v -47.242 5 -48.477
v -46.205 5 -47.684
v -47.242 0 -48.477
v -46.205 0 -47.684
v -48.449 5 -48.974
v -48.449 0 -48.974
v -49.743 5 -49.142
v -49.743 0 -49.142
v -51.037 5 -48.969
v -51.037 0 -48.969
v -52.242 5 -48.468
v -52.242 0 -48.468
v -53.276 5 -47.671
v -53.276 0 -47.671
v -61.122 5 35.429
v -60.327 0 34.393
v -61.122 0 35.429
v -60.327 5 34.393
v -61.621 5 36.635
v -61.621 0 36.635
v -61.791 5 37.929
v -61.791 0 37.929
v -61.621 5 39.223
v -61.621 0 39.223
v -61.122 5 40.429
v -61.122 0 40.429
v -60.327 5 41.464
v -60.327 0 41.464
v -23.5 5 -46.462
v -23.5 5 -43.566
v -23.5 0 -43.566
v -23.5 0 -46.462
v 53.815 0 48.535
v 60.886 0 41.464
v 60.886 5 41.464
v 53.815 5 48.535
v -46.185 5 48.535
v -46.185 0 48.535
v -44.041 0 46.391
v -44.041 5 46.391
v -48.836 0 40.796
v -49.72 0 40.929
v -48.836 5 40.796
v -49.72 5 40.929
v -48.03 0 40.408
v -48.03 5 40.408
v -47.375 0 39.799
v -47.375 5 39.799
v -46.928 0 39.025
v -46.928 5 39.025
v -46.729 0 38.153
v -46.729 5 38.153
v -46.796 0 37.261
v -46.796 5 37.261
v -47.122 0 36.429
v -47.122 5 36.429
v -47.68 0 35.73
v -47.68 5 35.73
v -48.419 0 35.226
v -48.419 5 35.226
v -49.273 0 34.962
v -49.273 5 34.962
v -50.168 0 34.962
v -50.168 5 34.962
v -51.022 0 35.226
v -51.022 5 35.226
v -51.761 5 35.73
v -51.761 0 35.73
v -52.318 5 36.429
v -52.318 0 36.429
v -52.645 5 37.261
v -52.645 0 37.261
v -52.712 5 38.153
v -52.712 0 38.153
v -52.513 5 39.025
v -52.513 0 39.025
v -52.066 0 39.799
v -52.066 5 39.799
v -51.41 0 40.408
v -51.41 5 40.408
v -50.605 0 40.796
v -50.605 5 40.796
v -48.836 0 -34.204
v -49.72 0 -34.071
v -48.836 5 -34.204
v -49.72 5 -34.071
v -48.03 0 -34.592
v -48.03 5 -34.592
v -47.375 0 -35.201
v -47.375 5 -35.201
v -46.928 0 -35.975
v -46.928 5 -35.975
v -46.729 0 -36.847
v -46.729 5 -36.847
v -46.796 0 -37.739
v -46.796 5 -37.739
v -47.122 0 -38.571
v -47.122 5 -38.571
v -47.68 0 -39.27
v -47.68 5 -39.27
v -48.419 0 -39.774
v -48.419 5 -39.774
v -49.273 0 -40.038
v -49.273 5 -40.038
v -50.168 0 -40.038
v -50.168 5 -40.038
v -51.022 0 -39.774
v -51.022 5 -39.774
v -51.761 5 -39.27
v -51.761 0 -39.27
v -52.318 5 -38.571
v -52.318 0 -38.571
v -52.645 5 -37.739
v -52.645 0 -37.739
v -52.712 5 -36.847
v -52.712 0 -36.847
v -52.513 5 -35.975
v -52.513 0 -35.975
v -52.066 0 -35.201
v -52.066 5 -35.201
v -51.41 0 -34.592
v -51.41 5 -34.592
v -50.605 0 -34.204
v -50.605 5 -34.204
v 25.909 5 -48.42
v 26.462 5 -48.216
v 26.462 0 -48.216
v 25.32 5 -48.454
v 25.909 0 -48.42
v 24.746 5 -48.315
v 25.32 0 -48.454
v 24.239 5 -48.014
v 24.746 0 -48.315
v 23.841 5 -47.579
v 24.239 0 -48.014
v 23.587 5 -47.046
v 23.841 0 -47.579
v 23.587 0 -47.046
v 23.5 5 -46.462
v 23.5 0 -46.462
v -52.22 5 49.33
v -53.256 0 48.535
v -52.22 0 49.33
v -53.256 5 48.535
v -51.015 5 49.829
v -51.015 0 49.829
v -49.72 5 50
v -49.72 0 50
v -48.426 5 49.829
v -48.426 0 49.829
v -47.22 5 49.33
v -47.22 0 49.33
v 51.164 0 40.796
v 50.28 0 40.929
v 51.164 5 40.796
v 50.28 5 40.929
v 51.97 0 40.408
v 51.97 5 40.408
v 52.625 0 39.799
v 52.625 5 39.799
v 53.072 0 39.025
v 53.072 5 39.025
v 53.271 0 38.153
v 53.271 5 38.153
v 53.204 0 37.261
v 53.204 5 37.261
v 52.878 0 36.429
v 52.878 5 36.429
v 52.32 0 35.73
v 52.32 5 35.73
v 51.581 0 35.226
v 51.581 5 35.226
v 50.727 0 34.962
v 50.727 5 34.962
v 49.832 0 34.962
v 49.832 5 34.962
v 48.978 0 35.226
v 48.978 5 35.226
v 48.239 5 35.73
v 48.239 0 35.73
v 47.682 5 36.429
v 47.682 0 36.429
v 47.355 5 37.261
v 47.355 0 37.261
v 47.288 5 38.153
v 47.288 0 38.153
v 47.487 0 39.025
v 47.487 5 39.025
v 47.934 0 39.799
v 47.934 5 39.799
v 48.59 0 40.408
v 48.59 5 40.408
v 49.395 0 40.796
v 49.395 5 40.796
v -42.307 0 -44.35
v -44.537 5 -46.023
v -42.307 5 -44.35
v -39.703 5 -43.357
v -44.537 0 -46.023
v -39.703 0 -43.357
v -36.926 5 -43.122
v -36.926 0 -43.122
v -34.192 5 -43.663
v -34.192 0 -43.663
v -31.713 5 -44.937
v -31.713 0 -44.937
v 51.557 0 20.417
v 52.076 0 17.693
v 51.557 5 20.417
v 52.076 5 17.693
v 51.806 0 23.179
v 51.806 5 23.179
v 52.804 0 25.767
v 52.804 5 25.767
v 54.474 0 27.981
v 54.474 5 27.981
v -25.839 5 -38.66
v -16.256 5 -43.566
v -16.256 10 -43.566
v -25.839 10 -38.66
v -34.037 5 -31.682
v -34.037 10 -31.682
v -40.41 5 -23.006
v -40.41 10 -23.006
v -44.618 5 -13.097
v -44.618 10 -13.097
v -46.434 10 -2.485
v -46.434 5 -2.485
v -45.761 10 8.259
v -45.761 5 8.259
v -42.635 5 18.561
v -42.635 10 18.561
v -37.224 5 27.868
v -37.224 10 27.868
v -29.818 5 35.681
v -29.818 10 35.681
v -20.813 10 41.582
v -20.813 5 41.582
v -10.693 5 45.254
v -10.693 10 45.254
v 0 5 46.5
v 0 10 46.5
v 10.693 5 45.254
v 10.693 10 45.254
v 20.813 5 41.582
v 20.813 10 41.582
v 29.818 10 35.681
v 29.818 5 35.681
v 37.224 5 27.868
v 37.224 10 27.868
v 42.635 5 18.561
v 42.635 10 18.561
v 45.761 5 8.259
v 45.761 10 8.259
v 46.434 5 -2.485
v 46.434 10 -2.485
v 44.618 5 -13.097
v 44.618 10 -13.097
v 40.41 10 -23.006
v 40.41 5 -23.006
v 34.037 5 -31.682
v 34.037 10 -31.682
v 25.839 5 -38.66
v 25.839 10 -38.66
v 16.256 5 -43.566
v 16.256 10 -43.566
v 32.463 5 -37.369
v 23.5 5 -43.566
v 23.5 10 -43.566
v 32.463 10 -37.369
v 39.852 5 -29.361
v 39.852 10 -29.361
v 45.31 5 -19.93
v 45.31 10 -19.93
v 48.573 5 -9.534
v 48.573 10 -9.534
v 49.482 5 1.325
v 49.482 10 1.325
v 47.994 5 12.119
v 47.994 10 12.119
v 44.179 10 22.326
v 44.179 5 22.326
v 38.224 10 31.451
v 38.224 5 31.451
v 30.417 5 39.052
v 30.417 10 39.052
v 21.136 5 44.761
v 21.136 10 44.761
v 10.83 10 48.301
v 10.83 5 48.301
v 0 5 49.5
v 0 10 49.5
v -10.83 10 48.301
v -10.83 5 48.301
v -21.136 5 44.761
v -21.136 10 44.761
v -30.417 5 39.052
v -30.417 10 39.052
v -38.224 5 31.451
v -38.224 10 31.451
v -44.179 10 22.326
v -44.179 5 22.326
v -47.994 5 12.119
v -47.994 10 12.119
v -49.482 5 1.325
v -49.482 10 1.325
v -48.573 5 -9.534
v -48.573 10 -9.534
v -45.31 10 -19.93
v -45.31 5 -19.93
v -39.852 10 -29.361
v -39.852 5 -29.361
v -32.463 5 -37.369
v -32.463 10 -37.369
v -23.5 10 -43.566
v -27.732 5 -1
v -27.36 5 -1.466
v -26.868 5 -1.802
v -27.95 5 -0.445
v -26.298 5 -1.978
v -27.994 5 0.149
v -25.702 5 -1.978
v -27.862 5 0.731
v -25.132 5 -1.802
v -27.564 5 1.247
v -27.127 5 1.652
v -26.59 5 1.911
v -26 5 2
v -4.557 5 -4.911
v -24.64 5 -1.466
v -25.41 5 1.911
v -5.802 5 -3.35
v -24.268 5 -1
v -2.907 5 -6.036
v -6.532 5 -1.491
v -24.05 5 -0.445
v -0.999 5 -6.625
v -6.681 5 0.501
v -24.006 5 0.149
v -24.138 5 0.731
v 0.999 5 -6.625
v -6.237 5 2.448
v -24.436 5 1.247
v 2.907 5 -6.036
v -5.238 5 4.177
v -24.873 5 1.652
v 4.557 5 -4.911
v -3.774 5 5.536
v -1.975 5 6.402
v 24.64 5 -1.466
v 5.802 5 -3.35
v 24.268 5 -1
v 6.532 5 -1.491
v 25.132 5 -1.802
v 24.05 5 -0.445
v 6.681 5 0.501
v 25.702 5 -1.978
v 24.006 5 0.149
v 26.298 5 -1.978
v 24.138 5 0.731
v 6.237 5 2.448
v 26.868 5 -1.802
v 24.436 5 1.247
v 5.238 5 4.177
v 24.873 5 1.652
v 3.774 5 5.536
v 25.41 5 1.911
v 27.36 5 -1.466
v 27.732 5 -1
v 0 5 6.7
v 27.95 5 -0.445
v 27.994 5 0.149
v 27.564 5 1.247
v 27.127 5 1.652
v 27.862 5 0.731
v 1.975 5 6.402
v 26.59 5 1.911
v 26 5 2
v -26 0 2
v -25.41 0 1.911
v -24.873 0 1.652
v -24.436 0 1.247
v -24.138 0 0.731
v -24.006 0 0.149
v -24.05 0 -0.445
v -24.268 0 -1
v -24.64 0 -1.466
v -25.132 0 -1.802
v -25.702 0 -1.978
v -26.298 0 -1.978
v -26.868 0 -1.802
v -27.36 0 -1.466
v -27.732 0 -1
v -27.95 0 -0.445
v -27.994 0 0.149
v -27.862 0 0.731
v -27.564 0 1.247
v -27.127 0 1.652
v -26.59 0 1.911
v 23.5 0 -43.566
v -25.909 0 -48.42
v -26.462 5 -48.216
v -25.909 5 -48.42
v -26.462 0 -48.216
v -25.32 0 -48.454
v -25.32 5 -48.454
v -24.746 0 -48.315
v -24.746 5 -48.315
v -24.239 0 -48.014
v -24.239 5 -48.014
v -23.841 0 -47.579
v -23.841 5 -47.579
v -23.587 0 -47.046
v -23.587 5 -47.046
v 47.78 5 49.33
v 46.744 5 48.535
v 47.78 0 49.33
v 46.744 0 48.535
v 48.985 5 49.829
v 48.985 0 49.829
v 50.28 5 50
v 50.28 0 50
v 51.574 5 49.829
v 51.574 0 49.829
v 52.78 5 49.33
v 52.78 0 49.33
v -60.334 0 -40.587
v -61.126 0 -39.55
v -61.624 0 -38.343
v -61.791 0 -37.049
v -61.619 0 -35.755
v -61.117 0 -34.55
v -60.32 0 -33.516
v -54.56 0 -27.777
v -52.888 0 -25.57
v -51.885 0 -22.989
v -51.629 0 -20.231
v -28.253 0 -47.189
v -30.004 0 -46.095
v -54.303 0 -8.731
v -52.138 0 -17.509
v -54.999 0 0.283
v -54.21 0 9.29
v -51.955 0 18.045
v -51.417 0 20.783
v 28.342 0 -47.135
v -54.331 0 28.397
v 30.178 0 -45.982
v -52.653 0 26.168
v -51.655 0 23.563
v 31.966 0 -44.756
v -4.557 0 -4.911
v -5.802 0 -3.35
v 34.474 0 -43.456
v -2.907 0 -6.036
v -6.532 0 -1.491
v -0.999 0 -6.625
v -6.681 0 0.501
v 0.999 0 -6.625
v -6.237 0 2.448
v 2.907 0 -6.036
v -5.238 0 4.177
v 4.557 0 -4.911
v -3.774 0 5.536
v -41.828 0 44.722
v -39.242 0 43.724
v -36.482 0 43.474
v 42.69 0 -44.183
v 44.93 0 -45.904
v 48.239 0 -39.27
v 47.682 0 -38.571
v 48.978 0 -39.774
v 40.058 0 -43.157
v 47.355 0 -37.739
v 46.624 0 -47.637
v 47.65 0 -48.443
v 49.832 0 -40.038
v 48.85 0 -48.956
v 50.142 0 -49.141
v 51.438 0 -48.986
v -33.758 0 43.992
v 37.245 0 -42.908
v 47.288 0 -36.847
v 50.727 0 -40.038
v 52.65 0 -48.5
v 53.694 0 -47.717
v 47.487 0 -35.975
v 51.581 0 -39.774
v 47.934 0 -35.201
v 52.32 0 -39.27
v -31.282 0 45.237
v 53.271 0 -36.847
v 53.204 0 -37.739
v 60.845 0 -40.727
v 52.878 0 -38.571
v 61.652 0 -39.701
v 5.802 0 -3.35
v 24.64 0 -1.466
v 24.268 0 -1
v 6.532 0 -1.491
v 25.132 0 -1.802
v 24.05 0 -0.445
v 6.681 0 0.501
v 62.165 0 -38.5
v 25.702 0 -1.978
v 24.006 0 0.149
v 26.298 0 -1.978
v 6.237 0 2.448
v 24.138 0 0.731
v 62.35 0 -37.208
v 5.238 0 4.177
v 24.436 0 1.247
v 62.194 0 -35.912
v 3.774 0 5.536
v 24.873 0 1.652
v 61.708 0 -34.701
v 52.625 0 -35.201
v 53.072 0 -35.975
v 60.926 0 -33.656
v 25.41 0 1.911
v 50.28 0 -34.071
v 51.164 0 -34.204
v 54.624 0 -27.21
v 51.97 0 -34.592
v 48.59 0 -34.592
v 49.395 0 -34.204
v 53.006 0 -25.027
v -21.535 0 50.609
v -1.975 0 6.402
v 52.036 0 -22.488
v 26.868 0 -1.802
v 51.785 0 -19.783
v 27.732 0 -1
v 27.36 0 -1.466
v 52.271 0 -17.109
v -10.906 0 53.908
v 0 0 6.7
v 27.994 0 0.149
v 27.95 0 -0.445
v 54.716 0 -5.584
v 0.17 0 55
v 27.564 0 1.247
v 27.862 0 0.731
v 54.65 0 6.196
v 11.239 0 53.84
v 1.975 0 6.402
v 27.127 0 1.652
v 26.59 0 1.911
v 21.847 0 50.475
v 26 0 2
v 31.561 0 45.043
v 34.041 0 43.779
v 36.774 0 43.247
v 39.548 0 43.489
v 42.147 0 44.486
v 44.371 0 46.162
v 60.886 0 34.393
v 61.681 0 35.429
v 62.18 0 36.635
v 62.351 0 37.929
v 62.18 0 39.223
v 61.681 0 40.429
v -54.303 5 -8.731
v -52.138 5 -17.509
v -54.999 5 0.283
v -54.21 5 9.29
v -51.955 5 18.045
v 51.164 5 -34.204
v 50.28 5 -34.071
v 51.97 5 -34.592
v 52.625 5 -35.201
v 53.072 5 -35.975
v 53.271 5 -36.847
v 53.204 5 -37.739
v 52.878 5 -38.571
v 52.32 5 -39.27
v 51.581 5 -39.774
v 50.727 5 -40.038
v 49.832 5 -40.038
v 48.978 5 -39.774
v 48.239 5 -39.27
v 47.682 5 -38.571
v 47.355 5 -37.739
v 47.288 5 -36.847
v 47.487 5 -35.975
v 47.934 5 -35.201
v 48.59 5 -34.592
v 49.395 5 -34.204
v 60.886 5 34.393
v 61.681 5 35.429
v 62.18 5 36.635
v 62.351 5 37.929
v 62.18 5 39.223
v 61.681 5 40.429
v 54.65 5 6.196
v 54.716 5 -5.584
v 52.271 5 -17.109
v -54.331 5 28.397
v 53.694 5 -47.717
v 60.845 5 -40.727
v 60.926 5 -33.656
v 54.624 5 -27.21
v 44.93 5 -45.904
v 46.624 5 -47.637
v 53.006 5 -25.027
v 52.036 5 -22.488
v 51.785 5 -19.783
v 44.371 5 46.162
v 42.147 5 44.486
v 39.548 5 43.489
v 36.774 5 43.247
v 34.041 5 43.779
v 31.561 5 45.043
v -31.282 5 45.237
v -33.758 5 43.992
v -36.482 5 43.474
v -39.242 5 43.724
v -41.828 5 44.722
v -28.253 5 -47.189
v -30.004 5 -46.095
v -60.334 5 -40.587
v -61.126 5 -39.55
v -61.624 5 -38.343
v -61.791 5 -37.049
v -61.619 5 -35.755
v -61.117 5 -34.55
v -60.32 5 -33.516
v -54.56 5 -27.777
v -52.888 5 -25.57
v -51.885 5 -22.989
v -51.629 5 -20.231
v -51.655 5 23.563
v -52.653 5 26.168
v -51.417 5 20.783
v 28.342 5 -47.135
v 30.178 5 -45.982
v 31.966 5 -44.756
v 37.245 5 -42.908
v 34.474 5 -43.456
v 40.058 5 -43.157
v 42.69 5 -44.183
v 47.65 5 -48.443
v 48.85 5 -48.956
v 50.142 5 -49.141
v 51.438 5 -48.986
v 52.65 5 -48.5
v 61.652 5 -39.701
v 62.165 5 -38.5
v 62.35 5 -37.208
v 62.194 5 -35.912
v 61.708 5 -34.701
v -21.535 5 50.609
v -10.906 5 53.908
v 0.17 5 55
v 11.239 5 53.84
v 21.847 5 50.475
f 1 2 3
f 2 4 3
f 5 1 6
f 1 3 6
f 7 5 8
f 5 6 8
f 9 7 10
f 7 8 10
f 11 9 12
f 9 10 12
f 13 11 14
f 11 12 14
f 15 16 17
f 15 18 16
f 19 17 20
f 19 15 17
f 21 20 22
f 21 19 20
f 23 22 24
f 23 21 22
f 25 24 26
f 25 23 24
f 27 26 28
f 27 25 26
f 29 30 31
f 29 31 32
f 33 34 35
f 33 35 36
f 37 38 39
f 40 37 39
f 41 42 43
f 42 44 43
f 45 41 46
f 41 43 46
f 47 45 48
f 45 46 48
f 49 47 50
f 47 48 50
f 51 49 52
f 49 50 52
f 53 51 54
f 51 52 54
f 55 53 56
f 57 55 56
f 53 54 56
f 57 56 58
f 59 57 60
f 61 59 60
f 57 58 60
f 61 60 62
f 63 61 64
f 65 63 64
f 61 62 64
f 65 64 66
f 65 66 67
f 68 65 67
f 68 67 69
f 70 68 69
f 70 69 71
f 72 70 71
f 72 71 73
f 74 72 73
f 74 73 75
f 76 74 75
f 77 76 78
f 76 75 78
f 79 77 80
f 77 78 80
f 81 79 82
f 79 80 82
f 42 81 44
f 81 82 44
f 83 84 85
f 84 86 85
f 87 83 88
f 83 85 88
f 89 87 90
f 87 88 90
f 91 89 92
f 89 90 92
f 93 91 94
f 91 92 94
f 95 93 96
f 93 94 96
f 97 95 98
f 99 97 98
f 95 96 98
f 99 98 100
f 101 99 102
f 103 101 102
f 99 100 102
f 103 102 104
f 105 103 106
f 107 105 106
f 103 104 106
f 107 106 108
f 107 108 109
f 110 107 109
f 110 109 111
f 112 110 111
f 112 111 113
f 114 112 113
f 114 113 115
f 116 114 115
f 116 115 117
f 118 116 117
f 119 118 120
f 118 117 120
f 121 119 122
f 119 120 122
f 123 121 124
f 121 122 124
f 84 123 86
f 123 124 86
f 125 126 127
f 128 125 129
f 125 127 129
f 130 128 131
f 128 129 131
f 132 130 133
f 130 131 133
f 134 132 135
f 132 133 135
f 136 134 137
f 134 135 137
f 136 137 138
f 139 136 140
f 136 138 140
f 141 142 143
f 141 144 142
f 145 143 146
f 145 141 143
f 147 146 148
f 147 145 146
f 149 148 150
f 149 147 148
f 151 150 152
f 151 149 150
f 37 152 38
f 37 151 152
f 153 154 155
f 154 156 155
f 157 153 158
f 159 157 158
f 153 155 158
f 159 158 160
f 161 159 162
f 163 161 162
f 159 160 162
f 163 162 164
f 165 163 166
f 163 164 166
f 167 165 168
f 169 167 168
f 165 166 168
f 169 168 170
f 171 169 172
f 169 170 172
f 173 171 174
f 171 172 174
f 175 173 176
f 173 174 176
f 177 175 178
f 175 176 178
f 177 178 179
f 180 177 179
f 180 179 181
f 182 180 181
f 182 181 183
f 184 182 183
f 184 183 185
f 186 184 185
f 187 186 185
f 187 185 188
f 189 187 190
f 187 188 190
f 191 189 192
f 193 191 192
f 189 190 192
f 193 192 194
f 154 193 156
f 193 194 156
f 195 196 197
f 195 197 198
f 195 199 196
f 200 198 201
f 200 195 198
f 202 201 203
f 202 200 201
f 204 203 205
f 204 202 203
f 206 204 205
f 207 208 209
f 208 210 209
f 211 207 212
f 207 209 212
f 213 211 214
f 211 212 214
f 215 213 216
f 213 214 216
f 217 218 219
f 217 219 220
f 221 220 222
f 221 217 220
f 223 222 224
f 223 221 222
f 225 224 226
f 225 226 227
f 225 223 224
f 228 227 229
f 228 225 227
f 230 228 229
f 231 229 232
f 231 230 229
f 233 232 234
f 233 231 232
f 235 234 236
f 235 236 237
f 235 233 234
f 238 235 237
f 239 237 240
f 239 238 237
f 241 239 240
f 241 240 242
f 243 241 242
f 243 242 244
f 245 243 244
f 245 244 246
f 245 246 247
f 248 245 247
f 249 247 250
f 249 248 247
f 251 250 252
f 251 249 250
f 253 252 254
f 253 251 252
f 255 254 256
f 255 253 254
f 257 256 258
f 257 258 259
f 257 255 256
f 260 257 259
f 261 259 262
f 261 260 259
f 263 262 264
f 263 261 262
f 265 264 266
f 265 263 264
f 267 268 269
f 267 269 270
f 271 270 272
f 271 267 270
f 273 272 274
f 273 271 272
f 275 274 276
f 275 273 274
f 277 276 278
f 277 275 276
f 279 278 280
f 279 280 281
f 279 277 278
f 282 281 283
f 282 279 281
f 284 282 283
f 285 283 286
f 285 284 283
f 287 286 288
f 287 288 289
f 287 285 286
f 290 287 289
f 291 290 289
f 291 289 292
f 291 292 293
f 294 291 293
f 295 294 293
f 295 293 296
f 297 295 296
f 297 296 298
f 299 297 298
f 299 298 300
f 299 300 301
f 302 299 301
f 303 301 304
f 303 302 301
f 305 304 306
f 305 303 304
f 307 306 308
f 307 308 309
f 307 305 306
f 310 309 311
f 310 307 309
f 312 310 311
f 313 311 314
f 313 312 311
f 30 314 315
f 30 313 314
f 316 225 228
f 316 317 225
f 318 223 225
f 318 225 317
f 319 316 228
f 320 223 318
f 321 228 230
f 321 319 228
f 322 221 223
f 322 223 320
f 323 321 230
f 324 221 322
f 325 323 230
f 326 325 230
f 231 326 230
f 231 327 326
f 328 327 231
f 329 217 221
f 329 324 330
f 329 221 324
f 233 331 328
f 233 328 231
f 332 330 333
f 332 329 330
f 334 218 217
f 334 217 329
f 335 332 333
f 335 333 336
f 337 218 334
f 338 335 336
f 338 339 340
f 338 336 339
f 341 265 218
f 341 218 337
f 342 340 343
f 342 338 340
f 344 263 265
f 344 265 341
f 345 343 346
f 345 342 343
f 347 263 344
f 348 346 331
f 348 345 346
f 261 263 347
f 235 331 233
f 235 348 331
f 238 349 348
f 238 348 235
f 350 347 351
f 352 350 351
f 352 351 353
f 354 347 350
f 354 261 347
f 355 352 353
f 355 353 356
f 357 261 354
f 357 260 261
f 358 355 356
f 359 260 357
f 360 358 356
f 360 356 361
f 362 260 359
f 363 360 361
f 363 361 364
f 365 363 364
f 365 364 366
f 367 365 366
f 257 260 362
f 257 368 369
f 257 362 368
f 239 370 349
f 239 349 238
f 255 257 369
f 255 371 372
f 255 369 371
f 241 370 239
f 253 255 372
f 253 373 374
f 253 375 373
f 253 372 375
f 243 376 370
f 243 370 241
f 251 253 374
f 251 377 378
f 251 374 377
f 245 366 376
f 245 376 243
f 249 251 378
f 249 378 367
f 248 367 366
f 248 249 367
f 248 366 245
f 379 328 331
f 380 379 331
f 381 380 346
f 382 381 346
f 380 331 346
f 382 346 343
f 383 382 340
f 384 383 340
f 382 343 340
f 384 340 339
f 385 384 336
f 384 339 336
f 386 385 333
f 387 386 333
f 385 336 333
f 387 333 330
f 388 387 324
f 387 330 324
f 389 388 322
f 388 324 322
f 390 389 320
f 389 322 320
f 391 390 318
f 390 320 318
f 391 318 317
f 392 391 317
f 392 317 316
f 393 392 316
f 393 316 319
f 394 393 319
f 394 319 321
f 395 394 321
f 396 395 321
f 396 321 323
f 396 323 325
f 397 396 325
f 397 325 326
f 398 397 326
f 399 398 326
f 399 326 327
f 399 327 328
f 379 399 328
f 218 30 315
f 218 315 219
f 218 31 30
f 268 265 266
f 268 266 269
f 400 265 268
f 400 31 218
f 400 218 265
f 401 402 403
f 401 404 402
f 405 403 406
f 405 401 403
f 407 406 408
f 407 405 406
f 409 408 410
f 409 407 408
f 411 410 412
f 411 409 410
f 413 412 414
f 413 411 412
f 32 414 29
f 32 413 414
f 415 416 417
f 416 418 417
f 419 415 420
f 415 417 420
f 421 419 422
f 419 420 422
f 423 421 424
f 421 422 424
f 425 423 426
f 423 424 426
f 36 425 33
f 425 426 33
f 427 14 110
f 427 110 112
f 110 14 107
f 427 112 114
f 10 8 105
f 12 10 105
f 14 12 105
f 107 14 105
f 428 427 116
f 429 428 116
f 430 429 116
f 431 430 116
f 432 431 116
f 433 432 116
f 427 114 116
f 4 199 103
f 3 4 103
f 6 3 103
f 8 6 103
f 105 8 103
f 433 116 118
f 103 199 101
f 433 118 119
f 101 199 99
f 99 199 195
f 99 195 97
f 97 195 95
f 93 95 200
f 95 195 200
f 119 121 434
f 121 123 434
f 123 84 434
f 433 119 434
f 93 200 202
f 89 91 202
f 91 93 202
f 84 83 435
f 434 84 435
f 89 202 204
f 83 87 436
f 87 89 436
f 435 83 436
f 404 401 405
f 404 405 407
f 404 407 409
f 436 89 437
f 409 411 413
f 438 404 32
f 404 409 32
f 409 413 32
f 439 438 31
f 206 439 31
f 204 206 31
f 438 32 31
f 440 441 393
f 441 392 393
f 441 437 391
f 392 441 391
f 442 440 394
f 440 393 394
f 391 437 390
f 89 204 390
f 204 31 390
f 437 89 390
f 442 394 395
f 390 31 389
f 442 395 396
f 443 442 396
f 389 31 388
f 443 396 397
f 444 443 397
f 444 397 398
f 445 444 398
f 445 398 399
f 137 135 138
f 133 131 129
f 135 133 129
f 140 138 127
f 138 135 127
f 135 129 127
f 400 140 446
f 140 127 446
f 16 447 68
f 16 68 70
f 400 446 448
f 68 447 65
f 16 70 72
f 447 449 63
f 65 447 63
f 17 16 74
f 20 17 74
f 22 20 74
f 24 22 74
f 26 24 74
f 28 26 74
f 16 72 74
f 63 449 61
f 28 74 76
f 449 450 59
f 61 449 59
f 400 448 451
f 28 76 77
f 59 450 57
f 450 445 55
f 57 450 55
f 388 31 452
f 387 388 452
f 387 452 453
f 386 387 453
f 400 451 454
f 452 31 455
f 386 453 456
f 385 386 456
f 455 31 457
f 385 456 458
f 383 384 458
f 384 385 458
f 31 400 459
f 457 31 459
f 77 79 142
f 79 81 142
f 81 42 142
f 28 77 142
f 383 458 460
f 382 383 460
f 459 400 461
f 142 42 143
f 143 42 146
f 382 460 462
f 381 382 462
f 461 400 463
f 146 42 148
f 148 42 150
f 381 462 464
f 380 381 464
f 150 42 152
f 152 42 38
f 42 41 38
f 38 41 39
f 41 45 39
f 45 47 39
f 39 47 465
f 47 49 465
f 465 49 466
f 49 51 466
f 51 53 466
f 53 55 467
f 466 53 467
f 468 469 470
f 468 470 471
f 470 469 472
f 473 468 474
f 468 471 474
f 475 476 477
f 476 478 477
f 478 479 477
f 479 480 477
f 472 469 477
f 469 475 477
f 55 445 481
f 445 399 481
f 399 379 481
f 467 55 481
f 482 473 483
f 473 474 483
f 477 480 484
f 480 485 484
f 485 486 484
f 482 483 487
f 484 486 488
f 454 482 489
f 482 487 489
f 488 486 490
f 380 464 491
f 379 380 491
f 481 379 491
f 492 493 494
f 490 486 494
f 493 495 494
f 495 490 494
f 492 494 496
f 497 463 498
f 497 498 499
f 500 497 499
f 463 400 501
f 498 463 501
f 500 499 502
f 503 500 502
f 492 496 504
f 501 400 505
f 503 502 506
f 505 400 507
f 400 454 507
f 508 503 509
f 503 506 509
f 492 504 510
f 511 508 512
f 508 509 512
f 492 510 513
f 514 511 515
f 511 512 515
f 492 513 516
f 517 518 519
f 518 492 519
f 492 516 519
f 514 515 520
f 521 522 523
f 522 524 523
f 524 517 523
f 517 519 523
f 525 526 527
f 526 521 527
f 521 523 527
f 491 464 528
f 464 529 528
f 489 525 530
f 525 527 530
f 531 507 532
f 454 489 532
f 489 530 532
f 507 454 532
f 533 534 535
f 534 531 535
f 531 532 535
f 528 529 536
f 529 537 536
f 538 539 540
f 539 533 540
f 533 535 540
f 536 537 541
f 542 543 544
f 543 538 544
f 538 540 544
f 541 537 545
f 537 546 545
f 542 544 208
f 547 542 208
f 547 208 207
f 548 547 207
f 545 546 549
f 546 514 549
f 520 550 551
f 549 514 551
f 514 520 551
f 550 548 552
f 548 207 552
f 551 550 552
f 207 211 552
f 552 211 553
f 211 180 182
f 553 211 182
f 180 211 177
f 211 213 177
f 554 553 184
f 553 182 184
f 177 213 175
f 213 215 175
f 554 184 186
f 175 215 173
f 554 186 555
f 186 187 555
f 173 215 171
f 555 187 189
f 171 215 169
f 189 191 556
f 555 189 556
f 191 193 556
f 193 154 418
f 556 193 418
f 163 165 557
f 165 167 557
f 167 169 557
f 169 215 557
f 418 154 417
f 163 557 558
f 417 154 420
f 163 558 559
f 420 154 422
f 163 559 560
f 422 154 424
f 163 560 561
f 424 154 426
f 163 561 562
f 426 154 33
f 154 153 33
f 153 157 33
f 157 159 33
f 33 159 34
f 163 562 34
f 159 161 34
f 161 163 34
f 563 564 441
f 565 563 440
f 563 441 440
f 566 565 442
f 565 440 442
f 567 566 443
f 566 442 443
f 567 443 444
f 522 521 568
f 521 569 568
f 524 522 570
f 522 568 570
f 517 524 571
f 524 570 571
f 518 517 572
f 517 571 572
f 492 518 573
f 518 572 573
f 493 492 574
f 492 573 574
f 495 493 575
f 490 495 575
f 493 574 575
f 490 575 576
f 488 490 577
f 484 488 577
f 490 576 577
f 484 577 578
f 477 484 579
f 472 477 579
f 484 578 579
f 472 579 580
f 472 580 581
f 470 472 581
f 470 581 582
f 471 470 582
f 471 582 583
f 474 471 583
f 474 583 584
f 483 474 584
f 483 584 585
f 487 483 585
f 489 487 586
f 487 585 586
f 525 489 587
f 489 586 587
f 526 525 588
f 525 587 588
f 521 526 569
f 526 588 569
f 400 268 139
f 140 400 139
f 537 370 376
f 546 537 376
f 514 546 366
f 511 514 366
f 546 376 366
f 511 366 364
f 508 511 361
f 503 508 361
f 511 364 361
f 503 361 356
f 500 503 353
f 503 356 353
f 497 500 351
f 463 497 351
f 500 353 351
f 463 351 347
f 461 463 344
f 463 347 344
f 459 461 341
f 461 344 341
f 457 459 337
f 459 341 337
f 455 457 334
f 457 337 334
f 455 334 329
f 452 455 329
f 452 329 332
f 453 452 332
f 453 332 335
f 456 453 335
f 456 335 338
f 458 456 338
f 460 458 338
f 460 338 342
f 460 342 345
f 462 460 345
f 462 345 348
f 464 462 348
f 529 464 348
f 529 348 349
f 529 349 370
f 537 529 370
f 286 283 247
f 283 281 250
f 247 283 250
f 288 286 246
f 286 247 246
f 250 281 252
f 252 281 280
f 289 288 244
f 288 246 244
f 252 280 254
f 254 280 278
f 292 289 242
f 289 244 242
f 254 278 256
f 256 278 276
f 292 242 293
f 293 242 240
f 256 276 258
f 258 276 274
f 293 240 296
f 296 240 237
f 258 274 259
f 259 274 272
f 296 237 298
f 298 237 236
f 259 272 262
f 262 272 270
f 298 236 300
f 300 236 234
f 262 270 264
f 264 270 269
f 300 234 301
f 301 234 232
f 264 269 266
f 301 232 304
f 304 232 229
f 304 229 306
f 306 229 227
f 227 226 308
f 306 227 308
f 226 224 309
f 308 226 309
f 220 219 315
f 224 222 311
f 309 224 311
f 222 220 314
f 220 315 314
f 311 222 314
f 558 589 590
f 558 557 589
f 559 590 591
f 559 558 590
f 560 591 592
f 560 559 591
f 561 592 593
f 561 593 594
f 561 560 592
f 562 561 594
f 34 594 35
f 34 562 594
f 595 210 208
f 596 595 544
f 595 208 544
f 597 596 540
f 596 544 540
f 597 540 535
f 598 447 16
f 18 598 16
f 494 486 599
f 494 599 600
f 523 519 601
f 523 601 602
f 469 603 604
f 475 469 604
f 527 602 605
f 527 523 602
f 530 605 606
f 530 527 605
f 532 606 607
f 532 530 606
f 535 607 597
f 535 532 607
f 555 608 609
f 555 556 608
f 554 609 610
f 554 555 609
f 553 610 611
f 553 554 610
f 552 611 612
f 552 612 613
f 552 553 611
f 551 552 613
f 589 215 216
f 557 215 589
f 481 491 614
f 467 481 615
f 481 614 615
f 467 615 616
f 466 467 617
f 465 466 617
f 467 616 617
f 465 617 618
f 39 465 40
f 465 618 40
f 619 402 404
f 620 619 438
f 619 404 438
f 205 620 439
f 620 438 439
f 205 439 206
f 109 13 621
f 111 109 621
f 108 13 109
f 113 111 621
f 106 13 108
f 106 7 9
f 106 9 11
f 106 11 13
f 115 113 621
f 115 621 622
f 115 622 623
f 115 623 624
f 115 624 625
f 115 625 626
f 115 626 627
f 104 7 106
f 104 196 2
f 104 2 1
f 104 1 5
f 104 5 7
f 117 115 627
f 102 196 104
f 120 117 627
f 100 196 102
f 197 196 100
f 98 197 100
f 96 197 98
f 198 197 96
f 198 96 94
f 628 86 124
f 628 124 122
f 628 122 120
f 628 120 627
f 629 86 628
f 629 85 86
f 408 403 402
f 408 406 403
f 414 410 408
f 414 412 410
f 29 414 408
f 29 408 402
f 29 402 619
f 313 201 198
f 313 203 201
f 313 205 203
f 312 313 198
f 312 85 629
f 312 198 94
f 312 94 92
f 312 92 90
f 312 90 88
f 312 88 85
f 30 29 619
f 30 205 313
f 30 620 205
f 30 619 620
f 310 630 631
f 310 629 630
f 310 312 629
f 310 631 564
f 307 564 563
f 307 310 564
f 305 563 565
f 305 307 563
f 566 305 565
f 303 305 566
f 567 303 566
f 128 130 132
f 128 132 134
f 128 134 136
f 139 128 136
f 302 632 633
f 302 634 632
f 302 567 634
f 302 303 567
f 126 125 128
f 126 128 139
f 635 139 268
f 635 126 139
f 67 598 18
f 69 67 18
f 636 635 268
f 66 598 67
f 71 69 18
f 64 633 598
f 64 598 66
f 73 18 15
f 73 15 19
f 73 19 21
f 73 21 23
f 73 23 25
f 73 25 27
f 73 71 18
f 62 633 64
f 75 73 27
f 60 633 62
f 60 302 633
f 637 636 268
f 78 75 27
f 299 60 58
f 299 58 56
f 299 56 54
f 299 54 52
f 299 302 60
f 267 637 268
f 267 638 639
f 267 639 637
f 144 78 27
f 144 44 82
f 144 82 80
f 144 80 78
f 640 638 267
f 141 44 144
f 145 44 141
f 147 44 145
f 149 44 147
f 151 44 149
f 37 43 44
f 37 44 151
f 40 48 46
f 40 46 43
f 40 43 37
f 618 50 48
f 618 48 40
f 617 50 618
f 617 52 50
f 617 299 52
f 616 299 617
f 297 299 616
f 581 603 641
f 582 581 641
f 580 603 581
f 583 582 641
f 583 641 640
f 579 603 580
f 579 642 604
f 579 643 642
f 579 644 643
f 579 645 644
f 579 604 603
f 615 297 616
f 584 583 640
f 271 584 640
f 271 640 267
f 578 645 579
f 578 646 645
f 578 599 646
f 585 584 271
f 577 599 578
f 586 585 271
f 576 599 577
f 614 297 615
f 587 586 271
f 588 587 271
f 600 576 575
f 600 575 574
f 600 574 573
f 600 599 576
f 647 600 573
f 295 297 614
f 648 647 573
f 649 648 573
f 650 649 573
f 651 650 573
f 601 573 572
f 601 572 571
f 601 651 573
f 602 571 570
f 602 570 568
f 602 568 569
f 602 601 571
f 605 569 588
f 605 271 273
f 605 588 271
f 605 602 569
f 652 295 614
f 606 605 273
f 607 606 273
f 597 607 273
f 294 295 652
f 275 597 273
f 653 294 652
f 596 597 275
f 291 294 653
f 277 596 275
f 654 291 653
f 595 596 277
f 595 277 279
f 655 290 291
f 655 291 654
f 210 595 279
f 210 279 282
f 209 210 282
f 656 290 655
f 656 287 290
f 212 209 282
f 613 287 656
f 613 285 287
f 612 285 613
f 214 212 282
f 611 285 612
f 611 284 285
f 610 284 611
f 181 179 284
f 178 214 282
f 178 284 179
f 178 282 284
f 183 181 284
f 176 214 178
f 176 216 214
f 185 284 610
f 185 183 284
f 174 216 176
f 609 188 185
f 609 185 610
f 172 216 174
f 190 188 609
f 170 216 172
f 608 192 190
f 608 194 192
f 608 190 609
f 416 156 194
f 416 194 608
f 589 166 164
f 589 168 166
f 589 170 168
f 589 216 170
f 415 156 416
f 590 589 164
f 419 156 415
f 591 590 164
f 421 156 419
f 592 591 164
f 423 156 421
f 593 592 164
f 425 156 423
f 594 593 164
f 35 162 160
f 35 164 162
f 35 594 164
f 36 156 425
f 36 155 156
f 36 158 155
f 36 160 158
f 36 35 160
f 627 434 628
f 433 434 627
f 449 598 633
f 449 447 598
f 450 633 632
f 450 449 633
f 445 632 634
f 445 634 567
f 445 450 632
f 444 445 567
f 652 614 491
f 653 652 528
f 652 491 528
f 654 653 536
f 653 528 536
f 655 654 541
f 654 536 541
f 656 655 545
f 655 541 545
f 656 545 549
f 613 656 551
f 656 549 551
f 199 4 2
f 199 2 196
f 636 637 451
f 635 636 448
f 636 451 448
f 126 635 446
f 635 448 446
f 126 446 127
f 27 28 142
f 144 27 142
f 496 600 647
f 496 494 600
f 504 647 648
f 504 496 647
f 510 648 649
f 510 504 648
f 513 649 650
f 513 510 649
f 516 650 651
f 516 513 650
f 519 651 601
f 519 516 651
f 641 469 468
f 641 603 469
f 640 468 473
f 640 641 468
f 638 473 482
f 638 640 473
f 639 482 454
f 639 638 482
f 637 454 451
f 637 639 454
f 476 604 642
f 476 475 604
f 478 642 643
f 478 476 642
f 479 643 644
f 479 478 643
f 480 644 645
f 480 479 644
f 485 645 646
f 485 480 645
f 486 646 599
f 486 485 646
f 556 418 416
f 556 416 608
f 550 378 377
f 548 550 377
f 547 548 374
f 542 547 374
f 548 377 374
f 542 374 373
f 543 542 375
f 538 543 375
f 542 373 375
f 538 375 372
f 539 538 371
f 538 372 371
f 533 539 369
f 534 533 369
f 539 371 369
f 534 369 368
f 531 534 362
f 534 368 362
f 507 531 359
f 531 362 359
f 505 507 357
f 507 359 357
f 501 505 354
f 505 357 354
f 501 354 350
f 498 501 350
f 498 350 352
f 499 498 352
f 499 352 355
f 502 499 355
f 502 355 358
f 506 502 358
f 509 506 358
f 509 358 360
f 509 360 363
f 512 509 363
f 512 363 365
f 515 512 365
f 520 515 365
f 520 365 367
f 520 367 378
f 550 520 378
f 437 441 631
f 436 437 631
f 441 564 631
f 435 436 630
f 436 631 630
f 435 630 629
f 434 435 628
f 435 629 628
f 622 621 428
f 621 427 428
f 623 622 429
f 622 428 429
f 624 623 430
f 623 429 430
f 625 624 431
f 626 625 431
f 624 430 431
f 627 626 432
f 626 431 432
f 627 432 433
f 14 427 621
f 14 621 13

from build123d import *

# Parameters (mm, degrees)
SKETCH_1_R                  = 55
EXTRUDE_1_DEPTH             = 5
SKETCH_5_W                  = 47
SKETCH_5_H                  = 12.24289715
CUT_EXTRUDE_2_DEPTH         = 30
FILLET_4_R                  = 2
FILLET_5_R                  = 2
EXTRUDE_3_REACH             = 79.84
EXTRUDE_3_DIRECTION_2_REACH = 79.84
FILLET_7_R                  = 10
FILLET_8_R                  = 5
SKETCH_10_R                 = 3
CUT_EXTRUDE_5_DEPTH         = 5
SKETCH_15_R                 = 6.7
CUT_EXTRUDE_6_DEPTH         = 10
SKETCH_16_R                 = 2
CUT_EXTRUDE_7_DEPTH         = 10
EXTRUDE_4_DEPTH             = 5


with BuildPart() as part:
    # 草图1 → 凸台-拉伸1 (new body)
    with BuildSketch(Plane(origin=(0, 0, 0), x_dir=(1, 0, 0), z_dir=(0, 1, 0))):
        with Locations(Location((0, 0, 0), (0, 0, 270))):
            Circle(SKETCH_1_R)
    extrude(amount=EXTRUDE_1_DEPTH)

    # 草图5 → 切除-拉伸2 (cut)
    with BuildSketch(Plane(origin=(0, 5, 0), x_dir=(1, 0, 0), z_dir=(0, 1, 0))):
        with Locations((0, 49.687490397)):
            Rectangle(SKETCH_5_W, SKETCH_5_H)
    extrude(amount=-CUT_EXTRUDE_2_DEPTH, mode=Mode.SUBTRACT)

    # 圆角4
    fillet_4_edges = [part.edges().sort_by_distance(p)[0] for p in [
        (-23.5, 2.5, -49.726753363),
    ]]
    fillet(fillet_4_edges, radius=FILLET_4_R)

    # 圆角5
    fillet_5_edges = [part.edges().sort_by_distance(p)[0] for p in [
        (23.5, 2.5, -49.726753363),
    ]]
    fillet(fillet_5_edges, radius=FILLET_5_R)

    # 凸台-拉伸3: up to this face of the body (flat: up to its plane)
    extrude_3_end = Plane(part.part.faces().sort_by_distance((0, 0, 2.477505486))[0])
    # 草图14 → 凸台-拉伸3 (add, up to the picked face)
    with BuildSketch(Plane(origin=(0, 3, 0), x_dir=(1, 0, 0), z_dir=(0, 1, 0)), mode=Mode.PRIVATE) as extrude_3_sk1:
        with BuildLine():
            Line((-49.898576095, 23.132922507), (-63.862525635, 37.044772973))
            Line((-63.862525635, 37.044772973), (-49.746845912, 51.213315099))
            Line((-49.746845912, 51.213315099), (-38.128637352, 39.638453724))
            ThreePointArc((-38.128637352, 39.638453724), (-44.78063998, 31.932652301), (-49.898576095, 23.132922507))
        make_face()
    extrude_3_tool1 = split(extrude(extrude_3_sk1.sketch, amount=-EXTRUDE_3_REACH, mode=Mode.PRIVATE), bisect_by=extrude_3_end, keep=Keep.BOTH, mode=Mode.PRIVATE)
    # 草图14 → 凸台-拉伸3 (add, up to the picked face)
    with BuildSketch(Plane(origin=(0, 3, 0), x_dir=(1, 0, 0), z_dir=(0, 1, 0)), mode=Mode.PRIVATE) as extrude_3_sk2:
        with BuildLine():
            Line((49.811900188, -23.3189751), (64.421720913, -37.928795825))
            Line((64.421720913, -37.928795825), (50.279585289, -52.070931449))
            Line((50.279585289, -52.070931449), (37.984884655, -39.776230814))
            ThreePointArc((37.984884655, -39.776230814), (44.662950793, -32.097053236), (49.811900188, -23.3189751))
        make_face()
    extrude_3_tool2 = split(extrude(extrude_3_sk2.sketch, amount=-EXTRUDE_3_REACH, mode=Mode.PRIVATE), bisect_by=extrude_3_end, keep=Keep.BOTH, mode=Mode.PRIVATE)
    # 草图14 → 凸台-拉伸3 (add, up to the picked face)
    with BuildSketch(Plane(origin=(0, 3, 0), x_dir=(1, 0, 0), z_dir=(0, 1, 0)), mode=Mode.PRIVATE) as extrude_3_sk3:
        with BuildLine():
            Line((-49.632393674, -23.698639164), (-63.862550335, -37.928795825))
            Line((-63.862550335, -37.928795825), (-49.720414711, -52.070931449))
            Line((-49.720414711, -52.070931449), (-37.697852746, -40.048369484))
            ThreePointArc((-37.697852746, -40.048369484), (-44.423770724, -32.427281642), (-49.632393674, -23.698639164))
        make_face()
    extrude_3_tool3 = split(extrude(extrude_3_sk3.sketch, amount=-EXTRUDE_3_REACH, mode=Mode.PRIVATE), bisect_by=extrude_3_end, keep=Keep.BOTH, mode=Mode.PRIVATE)
    # 草图14 → 凸台-拉伸3 (add, up to the picked face)
    with BuildSketch(Plane(origin=(0, 3, 0), x_dir=(1, 0, 0), z_dir=(0, 1, 0)), mode=Mode.PRIVATE) as extrude_3_sk4:
        with BuildLine():
            Line((38.475737251, 39.301623923), (50.118901666, 51.212426922))
            Line((50.118901666, 51.212426922), (64.420808036, 37.231887798))
            Line((64.420808036, 37.231887798), (50.134465219, 22.6171483))
            ThreePointArc((50.134465219, 22.6171483), (45.083643676, 31.50341367), (38.475737251, 39.301623923))
        make_face()
    extrude_3_tool4 = split(extrude(extrude_3_sk4.sketch, amount=-EXTRUDE_3_REACH, mode=Mode.PRIVATE), bisect_by=extrude_3_end, keep=Keep.BOTH, mode=Mode.PRIVATE)
    add(extrude_3_tool1.solids().sort_by(Axis((-50.837096, 3, -37.73966), (0, -1, 0)))[0])
    add(extrude_3_tool2.solids().sort_by(Axis((51.039653, 3, 38.272151), (0, -1, 0)))[0])
    add(extrude_3_tool3.solids().sort_by(Axis((-50.639154, 3, 38.439997), (0, -1, 0)))[0])
    add(extrude_3_tool4.solids().sort_by(Axis((51.238479, 3, -37.552164), (0, -1, 0)))[0])

    # 凸台-拉伸3 direction 2: up to this face of the body (flat: up to its plane)
    extrude_3_direction_2_end = Plane(part.part.faces().sort_by_distance((0, 5, 2.477505486))[0])
    # 草图14 → 凸台-拉伸3 direction 2 (add, up to the picked face)
    with BuildSketch(Plane(origin=(0, 3, 0), x_dir=(1, 0, 0), z_dir=(0, 1, 0)), mode=Mode.PRIVATE) as extrude_3_direction_2_sk1:
        with BuildLine():
            Line((-49.898576095, 23.132922507), (-63.862525635, 37.044772973))
            Line((-63.862525635, 37.044772973), (-49.746845912, 51.213315099))
            Line((-49.746845912, 51.213315099), (-38.128637352, 39.638453724))
            ThreePointArc((-38.128637352, 39.638453724), (-44.78063998, 31.932652301), (-49.898576095, 23.132922507))
        make_face()
    extrude_3_direction_2_tool1 = split(extrude(extrude_3_direction_2_sk1.sketch, amount=EXTRUDE_3_DIRECTION_2_REACH, mode=Mode.PRIVATE), bisect_by=extrude_3_direction_2_end, keep=Keep.BOTH, mode=Mode.PRIVATE)
    # 草图14 → 凸台-拉伸3 direction 2 (add, up to the picked face)
    with BuildSketch(Plane(origin=(0, 3, 0), x_dir=(1, 0, 0), z_dir=(0, 1, 0)), mode=Mode.PRIVATE) as extrude_3_direction_2_sk2:
        with BuildLine():
            Line((49.811900188, -23.3189751), (64.421720913, -37.928795825))
            Line((64.421720913, -37.928795825), (50.279585289, -52.070931449))
            Line((50.279585289, -52.070931449), (37.984884655, -39.776230814))
            ThreePointArc((37.984884655, -39.776230814), (44.662950793, -32.097053236), (49.811900188, -23.3189751))
        make_face()
    extrude_3_direction_2_tool2 = split(extrude(extrude_3_direction_2_sk2.sketch, amount=EXTRUDE_3_DIRECTION_2_REACH, mode=Mode.PRIVATE), bisect_by=extrude_3_direction_2_end, keep=Keep.BOTH, mode=Mode.PRIVATE)
    # 草图14 → 凸台-拉伸3 direction 2 (add, up to the picked face)
    with BuildSketch(Plane(origin=(0, 3, 0), x_dir=(1, 0, 0), z_dir=(0, 1, 0)), mode=Mode.PRIVATE) as extrude_3_direction_2_sk3:
        with BuildLine():
            Line((-49.632393674, -23.698639164), (-63.862550335, -37.928795825))
            Line((-63.862550335, -37.928795825), (-49.720414711, -52.070931449))
            Line((-49.720414711, -52.070931449), (-37.697852746, -40.048369484))
            ThreePointArc((-37.697852746, -40.048369484), (-44.423770724, -32.427281642), (-49.632393674, -23.698639164))
        make_face()
    extrude_3_direction_2_tool3 = split(extrude(extrude_3_direction_2_sk3.sketch, amount=EXTRUDE_3_DIRECTION_2_REACH, mode=Mode.PRIVATE), bisect_by=extrude_3_direction_2_end, keep=Keep.BOTH, mode=Mode.PRIVATE)
    # 草图14 → 凸台-拉伸3 direction 2 (add, up to the picked face)
    with BuildSketch(Plane(origin=(0, 3, 0), x_dir=(1, 0, 0), z_dir=(0, 1, 0)), mode=Mode.PRIVATE) as extrude_3_direction_2_sk4:
        with BuildLine():
            Line((38.475737251, 39.301623923), (50.118901666, 51.212426922))
            Line((50.118901666, 51.212426922), (64.420808036, 37.231887798))
            Line((64.420808036, 37.231887798), (50.134465219, 22.6171483))
            ThreePointArc((50.134465219, 22.6171483), (45.083643676, 31.50341367), (38.475737251, 39.301623923))
        make_face()
    extrude_3_direction_2_tool4 = split(extrude(extrude_3_direction_2_sk4.sketch, amount=EXTRUDE_3_DIRECTION_2_REACH, mode=Mode.PRIVATE), bisect_by=extrude_3_direction_2_end, keep=Keep.BOTH, mode=Mode.PRIVATE)
    add(extrude_3_direction_2_tool1.solids().sort_by(Axis((-50.837096, 3, -37.73966), (0, 1, 0)))[0])
    add(extrude_3_direction_2_tool2.solids().sort_by(Axis((51.039653, 3, 38.272151), (0, 1, 0)))[0])
    add(extrude_3_direction_2_tool3.solids().sort_by(Axis((-50.639154, 3, 38.439997), (0, 1, 0)))[0])
    add(extrude_3_direction_2_tool4.solids().sort_by(Axis((51.238479, 3, -37.552164), (0, 1, 0)))[0])

    # 圆角7
    fillet_7_edges = [part.edges().sort_by_distance(p)[0] for p in [
        (-38.128637352, 2.5, -39.638453724),
        (-49.898576095, 2.5, -23.132922507),
        (-49.632393674, 2.5, 23.698639164),
        (-37.697852746, 2.5, 40.048369484),
        (50.134465219, 2.5, -22.6171483),
        (38.475737251, 2.5, -39.301623923),
        (37.984884655, 2.5, 39.776230814),
        (49.811900188, 2.5, 23.3189751),
    ]]
    fillet(fillet_7_edges, radius=FILLET_7_R)

    # 圆角8
    fillet_8_edges = [part.edges().sort_by_distance(p)[0] for p in [
        (-63.862525635, 2.5, -37.044772973),
        (-49.746845912, 2.5, -51.213315099),
        (-49.720414711, 2.5, 52.070931449),
        (-63.862550335, 2.5, 37.928795825),
        (50.118901666, 2.5, -51.212426922),
        (64.420808036, 2.5, -37.231887798),
        (50.279585289, 2.5, 52.070931449),
        (64.421720913, 2.5, 37.928795825),
    ]]
    fillet(fillet_8_edges, radius=FILLET_8_R)

    # 草图10 → 切除-拉伸5 (cut, symmetric)
    with BuildSketch(Plane(origin=(0, 3, 0), x_dir=(1, 0, 0), z_dir=(0, 1, 0))):
        with Locations(Location((-49.720414711, 37.071204175, 0), (0, 0, 270))):
            Circle(SKETCH_10_R)
        with Locations(Location((50.279585289, 37.071204175, 0), (0, 0, 270))):
            Circle(SKETCH_10_R)
        with Locations(Location((-49.720414711, -37.928795825, 0), (0, 0, 270))):
            Circle(SKETCH_10_R)
        with Locations(Location((50.279585289, -37.928795825, 0), (0, 0, 270))):
            Circle(SKETCH_10_R)
    extrude(amount=CUT_EXTRUDE_5_DEPTH, both=True, mode=Mode.SUBTRACT)

    # 草图15 → 切除-拉伸6 (cut)
    with BuildSketch(Plane(origin=(0, 5, 0), x_dir=(1, 0, 0), z_dir=(0, 1, 0))):
        with Locations(Location((0, 0, 0), (0, 0, 270))):
            Circle(SKETCH_15_R)
    extrude(amount=-CUT_EXTRUDE_6_DEPTH, mode=Mode.SUBTRACT)

    # 草图16 → 切除-拉伸7 (cut)
    with BuildSketch(Plane(origin=(0, 5, 0), x_dir=(1, 0, 0), z_dir=(0, 1, 0))):
        with Locations(Location((-26, 0, 0), (0, 0, 270))):
            Circle(SKETCH_16_R)
        with Locations(Location((26, 0, 0), (0, 0, 270))):
            Circle(SKETCH_16_R)
    extrude(amount=-CUT_EXTRUDE_7_DEPTH, mode=Mode.SUBTRACT)

    # 草图17 → 凸台-拉伸4 (add)
    with BuildSketch(Plane(origin=(0, 5, 0), x_dir=(1, 0, 0), z_dir=(0, 1, 0))):
        with BuildLine():
            Line((-23.5, 43.566041822), (-16.255768207, 43.566041822))
            ThreePointArc((-16.255768207, 43.566041822), (0, -46.5), (16.255768207, 43.566041822))
            Line((16.255768207, 43.566041822), (23.5, 43.566041822))
            ThreePointArc((23.5, 43.566041822), (0, -49.5), (-23.5, 43.566041822))
        make_face()
    extrude(amount=EXTRUDE_4_DEPTH)


solid = part.part
